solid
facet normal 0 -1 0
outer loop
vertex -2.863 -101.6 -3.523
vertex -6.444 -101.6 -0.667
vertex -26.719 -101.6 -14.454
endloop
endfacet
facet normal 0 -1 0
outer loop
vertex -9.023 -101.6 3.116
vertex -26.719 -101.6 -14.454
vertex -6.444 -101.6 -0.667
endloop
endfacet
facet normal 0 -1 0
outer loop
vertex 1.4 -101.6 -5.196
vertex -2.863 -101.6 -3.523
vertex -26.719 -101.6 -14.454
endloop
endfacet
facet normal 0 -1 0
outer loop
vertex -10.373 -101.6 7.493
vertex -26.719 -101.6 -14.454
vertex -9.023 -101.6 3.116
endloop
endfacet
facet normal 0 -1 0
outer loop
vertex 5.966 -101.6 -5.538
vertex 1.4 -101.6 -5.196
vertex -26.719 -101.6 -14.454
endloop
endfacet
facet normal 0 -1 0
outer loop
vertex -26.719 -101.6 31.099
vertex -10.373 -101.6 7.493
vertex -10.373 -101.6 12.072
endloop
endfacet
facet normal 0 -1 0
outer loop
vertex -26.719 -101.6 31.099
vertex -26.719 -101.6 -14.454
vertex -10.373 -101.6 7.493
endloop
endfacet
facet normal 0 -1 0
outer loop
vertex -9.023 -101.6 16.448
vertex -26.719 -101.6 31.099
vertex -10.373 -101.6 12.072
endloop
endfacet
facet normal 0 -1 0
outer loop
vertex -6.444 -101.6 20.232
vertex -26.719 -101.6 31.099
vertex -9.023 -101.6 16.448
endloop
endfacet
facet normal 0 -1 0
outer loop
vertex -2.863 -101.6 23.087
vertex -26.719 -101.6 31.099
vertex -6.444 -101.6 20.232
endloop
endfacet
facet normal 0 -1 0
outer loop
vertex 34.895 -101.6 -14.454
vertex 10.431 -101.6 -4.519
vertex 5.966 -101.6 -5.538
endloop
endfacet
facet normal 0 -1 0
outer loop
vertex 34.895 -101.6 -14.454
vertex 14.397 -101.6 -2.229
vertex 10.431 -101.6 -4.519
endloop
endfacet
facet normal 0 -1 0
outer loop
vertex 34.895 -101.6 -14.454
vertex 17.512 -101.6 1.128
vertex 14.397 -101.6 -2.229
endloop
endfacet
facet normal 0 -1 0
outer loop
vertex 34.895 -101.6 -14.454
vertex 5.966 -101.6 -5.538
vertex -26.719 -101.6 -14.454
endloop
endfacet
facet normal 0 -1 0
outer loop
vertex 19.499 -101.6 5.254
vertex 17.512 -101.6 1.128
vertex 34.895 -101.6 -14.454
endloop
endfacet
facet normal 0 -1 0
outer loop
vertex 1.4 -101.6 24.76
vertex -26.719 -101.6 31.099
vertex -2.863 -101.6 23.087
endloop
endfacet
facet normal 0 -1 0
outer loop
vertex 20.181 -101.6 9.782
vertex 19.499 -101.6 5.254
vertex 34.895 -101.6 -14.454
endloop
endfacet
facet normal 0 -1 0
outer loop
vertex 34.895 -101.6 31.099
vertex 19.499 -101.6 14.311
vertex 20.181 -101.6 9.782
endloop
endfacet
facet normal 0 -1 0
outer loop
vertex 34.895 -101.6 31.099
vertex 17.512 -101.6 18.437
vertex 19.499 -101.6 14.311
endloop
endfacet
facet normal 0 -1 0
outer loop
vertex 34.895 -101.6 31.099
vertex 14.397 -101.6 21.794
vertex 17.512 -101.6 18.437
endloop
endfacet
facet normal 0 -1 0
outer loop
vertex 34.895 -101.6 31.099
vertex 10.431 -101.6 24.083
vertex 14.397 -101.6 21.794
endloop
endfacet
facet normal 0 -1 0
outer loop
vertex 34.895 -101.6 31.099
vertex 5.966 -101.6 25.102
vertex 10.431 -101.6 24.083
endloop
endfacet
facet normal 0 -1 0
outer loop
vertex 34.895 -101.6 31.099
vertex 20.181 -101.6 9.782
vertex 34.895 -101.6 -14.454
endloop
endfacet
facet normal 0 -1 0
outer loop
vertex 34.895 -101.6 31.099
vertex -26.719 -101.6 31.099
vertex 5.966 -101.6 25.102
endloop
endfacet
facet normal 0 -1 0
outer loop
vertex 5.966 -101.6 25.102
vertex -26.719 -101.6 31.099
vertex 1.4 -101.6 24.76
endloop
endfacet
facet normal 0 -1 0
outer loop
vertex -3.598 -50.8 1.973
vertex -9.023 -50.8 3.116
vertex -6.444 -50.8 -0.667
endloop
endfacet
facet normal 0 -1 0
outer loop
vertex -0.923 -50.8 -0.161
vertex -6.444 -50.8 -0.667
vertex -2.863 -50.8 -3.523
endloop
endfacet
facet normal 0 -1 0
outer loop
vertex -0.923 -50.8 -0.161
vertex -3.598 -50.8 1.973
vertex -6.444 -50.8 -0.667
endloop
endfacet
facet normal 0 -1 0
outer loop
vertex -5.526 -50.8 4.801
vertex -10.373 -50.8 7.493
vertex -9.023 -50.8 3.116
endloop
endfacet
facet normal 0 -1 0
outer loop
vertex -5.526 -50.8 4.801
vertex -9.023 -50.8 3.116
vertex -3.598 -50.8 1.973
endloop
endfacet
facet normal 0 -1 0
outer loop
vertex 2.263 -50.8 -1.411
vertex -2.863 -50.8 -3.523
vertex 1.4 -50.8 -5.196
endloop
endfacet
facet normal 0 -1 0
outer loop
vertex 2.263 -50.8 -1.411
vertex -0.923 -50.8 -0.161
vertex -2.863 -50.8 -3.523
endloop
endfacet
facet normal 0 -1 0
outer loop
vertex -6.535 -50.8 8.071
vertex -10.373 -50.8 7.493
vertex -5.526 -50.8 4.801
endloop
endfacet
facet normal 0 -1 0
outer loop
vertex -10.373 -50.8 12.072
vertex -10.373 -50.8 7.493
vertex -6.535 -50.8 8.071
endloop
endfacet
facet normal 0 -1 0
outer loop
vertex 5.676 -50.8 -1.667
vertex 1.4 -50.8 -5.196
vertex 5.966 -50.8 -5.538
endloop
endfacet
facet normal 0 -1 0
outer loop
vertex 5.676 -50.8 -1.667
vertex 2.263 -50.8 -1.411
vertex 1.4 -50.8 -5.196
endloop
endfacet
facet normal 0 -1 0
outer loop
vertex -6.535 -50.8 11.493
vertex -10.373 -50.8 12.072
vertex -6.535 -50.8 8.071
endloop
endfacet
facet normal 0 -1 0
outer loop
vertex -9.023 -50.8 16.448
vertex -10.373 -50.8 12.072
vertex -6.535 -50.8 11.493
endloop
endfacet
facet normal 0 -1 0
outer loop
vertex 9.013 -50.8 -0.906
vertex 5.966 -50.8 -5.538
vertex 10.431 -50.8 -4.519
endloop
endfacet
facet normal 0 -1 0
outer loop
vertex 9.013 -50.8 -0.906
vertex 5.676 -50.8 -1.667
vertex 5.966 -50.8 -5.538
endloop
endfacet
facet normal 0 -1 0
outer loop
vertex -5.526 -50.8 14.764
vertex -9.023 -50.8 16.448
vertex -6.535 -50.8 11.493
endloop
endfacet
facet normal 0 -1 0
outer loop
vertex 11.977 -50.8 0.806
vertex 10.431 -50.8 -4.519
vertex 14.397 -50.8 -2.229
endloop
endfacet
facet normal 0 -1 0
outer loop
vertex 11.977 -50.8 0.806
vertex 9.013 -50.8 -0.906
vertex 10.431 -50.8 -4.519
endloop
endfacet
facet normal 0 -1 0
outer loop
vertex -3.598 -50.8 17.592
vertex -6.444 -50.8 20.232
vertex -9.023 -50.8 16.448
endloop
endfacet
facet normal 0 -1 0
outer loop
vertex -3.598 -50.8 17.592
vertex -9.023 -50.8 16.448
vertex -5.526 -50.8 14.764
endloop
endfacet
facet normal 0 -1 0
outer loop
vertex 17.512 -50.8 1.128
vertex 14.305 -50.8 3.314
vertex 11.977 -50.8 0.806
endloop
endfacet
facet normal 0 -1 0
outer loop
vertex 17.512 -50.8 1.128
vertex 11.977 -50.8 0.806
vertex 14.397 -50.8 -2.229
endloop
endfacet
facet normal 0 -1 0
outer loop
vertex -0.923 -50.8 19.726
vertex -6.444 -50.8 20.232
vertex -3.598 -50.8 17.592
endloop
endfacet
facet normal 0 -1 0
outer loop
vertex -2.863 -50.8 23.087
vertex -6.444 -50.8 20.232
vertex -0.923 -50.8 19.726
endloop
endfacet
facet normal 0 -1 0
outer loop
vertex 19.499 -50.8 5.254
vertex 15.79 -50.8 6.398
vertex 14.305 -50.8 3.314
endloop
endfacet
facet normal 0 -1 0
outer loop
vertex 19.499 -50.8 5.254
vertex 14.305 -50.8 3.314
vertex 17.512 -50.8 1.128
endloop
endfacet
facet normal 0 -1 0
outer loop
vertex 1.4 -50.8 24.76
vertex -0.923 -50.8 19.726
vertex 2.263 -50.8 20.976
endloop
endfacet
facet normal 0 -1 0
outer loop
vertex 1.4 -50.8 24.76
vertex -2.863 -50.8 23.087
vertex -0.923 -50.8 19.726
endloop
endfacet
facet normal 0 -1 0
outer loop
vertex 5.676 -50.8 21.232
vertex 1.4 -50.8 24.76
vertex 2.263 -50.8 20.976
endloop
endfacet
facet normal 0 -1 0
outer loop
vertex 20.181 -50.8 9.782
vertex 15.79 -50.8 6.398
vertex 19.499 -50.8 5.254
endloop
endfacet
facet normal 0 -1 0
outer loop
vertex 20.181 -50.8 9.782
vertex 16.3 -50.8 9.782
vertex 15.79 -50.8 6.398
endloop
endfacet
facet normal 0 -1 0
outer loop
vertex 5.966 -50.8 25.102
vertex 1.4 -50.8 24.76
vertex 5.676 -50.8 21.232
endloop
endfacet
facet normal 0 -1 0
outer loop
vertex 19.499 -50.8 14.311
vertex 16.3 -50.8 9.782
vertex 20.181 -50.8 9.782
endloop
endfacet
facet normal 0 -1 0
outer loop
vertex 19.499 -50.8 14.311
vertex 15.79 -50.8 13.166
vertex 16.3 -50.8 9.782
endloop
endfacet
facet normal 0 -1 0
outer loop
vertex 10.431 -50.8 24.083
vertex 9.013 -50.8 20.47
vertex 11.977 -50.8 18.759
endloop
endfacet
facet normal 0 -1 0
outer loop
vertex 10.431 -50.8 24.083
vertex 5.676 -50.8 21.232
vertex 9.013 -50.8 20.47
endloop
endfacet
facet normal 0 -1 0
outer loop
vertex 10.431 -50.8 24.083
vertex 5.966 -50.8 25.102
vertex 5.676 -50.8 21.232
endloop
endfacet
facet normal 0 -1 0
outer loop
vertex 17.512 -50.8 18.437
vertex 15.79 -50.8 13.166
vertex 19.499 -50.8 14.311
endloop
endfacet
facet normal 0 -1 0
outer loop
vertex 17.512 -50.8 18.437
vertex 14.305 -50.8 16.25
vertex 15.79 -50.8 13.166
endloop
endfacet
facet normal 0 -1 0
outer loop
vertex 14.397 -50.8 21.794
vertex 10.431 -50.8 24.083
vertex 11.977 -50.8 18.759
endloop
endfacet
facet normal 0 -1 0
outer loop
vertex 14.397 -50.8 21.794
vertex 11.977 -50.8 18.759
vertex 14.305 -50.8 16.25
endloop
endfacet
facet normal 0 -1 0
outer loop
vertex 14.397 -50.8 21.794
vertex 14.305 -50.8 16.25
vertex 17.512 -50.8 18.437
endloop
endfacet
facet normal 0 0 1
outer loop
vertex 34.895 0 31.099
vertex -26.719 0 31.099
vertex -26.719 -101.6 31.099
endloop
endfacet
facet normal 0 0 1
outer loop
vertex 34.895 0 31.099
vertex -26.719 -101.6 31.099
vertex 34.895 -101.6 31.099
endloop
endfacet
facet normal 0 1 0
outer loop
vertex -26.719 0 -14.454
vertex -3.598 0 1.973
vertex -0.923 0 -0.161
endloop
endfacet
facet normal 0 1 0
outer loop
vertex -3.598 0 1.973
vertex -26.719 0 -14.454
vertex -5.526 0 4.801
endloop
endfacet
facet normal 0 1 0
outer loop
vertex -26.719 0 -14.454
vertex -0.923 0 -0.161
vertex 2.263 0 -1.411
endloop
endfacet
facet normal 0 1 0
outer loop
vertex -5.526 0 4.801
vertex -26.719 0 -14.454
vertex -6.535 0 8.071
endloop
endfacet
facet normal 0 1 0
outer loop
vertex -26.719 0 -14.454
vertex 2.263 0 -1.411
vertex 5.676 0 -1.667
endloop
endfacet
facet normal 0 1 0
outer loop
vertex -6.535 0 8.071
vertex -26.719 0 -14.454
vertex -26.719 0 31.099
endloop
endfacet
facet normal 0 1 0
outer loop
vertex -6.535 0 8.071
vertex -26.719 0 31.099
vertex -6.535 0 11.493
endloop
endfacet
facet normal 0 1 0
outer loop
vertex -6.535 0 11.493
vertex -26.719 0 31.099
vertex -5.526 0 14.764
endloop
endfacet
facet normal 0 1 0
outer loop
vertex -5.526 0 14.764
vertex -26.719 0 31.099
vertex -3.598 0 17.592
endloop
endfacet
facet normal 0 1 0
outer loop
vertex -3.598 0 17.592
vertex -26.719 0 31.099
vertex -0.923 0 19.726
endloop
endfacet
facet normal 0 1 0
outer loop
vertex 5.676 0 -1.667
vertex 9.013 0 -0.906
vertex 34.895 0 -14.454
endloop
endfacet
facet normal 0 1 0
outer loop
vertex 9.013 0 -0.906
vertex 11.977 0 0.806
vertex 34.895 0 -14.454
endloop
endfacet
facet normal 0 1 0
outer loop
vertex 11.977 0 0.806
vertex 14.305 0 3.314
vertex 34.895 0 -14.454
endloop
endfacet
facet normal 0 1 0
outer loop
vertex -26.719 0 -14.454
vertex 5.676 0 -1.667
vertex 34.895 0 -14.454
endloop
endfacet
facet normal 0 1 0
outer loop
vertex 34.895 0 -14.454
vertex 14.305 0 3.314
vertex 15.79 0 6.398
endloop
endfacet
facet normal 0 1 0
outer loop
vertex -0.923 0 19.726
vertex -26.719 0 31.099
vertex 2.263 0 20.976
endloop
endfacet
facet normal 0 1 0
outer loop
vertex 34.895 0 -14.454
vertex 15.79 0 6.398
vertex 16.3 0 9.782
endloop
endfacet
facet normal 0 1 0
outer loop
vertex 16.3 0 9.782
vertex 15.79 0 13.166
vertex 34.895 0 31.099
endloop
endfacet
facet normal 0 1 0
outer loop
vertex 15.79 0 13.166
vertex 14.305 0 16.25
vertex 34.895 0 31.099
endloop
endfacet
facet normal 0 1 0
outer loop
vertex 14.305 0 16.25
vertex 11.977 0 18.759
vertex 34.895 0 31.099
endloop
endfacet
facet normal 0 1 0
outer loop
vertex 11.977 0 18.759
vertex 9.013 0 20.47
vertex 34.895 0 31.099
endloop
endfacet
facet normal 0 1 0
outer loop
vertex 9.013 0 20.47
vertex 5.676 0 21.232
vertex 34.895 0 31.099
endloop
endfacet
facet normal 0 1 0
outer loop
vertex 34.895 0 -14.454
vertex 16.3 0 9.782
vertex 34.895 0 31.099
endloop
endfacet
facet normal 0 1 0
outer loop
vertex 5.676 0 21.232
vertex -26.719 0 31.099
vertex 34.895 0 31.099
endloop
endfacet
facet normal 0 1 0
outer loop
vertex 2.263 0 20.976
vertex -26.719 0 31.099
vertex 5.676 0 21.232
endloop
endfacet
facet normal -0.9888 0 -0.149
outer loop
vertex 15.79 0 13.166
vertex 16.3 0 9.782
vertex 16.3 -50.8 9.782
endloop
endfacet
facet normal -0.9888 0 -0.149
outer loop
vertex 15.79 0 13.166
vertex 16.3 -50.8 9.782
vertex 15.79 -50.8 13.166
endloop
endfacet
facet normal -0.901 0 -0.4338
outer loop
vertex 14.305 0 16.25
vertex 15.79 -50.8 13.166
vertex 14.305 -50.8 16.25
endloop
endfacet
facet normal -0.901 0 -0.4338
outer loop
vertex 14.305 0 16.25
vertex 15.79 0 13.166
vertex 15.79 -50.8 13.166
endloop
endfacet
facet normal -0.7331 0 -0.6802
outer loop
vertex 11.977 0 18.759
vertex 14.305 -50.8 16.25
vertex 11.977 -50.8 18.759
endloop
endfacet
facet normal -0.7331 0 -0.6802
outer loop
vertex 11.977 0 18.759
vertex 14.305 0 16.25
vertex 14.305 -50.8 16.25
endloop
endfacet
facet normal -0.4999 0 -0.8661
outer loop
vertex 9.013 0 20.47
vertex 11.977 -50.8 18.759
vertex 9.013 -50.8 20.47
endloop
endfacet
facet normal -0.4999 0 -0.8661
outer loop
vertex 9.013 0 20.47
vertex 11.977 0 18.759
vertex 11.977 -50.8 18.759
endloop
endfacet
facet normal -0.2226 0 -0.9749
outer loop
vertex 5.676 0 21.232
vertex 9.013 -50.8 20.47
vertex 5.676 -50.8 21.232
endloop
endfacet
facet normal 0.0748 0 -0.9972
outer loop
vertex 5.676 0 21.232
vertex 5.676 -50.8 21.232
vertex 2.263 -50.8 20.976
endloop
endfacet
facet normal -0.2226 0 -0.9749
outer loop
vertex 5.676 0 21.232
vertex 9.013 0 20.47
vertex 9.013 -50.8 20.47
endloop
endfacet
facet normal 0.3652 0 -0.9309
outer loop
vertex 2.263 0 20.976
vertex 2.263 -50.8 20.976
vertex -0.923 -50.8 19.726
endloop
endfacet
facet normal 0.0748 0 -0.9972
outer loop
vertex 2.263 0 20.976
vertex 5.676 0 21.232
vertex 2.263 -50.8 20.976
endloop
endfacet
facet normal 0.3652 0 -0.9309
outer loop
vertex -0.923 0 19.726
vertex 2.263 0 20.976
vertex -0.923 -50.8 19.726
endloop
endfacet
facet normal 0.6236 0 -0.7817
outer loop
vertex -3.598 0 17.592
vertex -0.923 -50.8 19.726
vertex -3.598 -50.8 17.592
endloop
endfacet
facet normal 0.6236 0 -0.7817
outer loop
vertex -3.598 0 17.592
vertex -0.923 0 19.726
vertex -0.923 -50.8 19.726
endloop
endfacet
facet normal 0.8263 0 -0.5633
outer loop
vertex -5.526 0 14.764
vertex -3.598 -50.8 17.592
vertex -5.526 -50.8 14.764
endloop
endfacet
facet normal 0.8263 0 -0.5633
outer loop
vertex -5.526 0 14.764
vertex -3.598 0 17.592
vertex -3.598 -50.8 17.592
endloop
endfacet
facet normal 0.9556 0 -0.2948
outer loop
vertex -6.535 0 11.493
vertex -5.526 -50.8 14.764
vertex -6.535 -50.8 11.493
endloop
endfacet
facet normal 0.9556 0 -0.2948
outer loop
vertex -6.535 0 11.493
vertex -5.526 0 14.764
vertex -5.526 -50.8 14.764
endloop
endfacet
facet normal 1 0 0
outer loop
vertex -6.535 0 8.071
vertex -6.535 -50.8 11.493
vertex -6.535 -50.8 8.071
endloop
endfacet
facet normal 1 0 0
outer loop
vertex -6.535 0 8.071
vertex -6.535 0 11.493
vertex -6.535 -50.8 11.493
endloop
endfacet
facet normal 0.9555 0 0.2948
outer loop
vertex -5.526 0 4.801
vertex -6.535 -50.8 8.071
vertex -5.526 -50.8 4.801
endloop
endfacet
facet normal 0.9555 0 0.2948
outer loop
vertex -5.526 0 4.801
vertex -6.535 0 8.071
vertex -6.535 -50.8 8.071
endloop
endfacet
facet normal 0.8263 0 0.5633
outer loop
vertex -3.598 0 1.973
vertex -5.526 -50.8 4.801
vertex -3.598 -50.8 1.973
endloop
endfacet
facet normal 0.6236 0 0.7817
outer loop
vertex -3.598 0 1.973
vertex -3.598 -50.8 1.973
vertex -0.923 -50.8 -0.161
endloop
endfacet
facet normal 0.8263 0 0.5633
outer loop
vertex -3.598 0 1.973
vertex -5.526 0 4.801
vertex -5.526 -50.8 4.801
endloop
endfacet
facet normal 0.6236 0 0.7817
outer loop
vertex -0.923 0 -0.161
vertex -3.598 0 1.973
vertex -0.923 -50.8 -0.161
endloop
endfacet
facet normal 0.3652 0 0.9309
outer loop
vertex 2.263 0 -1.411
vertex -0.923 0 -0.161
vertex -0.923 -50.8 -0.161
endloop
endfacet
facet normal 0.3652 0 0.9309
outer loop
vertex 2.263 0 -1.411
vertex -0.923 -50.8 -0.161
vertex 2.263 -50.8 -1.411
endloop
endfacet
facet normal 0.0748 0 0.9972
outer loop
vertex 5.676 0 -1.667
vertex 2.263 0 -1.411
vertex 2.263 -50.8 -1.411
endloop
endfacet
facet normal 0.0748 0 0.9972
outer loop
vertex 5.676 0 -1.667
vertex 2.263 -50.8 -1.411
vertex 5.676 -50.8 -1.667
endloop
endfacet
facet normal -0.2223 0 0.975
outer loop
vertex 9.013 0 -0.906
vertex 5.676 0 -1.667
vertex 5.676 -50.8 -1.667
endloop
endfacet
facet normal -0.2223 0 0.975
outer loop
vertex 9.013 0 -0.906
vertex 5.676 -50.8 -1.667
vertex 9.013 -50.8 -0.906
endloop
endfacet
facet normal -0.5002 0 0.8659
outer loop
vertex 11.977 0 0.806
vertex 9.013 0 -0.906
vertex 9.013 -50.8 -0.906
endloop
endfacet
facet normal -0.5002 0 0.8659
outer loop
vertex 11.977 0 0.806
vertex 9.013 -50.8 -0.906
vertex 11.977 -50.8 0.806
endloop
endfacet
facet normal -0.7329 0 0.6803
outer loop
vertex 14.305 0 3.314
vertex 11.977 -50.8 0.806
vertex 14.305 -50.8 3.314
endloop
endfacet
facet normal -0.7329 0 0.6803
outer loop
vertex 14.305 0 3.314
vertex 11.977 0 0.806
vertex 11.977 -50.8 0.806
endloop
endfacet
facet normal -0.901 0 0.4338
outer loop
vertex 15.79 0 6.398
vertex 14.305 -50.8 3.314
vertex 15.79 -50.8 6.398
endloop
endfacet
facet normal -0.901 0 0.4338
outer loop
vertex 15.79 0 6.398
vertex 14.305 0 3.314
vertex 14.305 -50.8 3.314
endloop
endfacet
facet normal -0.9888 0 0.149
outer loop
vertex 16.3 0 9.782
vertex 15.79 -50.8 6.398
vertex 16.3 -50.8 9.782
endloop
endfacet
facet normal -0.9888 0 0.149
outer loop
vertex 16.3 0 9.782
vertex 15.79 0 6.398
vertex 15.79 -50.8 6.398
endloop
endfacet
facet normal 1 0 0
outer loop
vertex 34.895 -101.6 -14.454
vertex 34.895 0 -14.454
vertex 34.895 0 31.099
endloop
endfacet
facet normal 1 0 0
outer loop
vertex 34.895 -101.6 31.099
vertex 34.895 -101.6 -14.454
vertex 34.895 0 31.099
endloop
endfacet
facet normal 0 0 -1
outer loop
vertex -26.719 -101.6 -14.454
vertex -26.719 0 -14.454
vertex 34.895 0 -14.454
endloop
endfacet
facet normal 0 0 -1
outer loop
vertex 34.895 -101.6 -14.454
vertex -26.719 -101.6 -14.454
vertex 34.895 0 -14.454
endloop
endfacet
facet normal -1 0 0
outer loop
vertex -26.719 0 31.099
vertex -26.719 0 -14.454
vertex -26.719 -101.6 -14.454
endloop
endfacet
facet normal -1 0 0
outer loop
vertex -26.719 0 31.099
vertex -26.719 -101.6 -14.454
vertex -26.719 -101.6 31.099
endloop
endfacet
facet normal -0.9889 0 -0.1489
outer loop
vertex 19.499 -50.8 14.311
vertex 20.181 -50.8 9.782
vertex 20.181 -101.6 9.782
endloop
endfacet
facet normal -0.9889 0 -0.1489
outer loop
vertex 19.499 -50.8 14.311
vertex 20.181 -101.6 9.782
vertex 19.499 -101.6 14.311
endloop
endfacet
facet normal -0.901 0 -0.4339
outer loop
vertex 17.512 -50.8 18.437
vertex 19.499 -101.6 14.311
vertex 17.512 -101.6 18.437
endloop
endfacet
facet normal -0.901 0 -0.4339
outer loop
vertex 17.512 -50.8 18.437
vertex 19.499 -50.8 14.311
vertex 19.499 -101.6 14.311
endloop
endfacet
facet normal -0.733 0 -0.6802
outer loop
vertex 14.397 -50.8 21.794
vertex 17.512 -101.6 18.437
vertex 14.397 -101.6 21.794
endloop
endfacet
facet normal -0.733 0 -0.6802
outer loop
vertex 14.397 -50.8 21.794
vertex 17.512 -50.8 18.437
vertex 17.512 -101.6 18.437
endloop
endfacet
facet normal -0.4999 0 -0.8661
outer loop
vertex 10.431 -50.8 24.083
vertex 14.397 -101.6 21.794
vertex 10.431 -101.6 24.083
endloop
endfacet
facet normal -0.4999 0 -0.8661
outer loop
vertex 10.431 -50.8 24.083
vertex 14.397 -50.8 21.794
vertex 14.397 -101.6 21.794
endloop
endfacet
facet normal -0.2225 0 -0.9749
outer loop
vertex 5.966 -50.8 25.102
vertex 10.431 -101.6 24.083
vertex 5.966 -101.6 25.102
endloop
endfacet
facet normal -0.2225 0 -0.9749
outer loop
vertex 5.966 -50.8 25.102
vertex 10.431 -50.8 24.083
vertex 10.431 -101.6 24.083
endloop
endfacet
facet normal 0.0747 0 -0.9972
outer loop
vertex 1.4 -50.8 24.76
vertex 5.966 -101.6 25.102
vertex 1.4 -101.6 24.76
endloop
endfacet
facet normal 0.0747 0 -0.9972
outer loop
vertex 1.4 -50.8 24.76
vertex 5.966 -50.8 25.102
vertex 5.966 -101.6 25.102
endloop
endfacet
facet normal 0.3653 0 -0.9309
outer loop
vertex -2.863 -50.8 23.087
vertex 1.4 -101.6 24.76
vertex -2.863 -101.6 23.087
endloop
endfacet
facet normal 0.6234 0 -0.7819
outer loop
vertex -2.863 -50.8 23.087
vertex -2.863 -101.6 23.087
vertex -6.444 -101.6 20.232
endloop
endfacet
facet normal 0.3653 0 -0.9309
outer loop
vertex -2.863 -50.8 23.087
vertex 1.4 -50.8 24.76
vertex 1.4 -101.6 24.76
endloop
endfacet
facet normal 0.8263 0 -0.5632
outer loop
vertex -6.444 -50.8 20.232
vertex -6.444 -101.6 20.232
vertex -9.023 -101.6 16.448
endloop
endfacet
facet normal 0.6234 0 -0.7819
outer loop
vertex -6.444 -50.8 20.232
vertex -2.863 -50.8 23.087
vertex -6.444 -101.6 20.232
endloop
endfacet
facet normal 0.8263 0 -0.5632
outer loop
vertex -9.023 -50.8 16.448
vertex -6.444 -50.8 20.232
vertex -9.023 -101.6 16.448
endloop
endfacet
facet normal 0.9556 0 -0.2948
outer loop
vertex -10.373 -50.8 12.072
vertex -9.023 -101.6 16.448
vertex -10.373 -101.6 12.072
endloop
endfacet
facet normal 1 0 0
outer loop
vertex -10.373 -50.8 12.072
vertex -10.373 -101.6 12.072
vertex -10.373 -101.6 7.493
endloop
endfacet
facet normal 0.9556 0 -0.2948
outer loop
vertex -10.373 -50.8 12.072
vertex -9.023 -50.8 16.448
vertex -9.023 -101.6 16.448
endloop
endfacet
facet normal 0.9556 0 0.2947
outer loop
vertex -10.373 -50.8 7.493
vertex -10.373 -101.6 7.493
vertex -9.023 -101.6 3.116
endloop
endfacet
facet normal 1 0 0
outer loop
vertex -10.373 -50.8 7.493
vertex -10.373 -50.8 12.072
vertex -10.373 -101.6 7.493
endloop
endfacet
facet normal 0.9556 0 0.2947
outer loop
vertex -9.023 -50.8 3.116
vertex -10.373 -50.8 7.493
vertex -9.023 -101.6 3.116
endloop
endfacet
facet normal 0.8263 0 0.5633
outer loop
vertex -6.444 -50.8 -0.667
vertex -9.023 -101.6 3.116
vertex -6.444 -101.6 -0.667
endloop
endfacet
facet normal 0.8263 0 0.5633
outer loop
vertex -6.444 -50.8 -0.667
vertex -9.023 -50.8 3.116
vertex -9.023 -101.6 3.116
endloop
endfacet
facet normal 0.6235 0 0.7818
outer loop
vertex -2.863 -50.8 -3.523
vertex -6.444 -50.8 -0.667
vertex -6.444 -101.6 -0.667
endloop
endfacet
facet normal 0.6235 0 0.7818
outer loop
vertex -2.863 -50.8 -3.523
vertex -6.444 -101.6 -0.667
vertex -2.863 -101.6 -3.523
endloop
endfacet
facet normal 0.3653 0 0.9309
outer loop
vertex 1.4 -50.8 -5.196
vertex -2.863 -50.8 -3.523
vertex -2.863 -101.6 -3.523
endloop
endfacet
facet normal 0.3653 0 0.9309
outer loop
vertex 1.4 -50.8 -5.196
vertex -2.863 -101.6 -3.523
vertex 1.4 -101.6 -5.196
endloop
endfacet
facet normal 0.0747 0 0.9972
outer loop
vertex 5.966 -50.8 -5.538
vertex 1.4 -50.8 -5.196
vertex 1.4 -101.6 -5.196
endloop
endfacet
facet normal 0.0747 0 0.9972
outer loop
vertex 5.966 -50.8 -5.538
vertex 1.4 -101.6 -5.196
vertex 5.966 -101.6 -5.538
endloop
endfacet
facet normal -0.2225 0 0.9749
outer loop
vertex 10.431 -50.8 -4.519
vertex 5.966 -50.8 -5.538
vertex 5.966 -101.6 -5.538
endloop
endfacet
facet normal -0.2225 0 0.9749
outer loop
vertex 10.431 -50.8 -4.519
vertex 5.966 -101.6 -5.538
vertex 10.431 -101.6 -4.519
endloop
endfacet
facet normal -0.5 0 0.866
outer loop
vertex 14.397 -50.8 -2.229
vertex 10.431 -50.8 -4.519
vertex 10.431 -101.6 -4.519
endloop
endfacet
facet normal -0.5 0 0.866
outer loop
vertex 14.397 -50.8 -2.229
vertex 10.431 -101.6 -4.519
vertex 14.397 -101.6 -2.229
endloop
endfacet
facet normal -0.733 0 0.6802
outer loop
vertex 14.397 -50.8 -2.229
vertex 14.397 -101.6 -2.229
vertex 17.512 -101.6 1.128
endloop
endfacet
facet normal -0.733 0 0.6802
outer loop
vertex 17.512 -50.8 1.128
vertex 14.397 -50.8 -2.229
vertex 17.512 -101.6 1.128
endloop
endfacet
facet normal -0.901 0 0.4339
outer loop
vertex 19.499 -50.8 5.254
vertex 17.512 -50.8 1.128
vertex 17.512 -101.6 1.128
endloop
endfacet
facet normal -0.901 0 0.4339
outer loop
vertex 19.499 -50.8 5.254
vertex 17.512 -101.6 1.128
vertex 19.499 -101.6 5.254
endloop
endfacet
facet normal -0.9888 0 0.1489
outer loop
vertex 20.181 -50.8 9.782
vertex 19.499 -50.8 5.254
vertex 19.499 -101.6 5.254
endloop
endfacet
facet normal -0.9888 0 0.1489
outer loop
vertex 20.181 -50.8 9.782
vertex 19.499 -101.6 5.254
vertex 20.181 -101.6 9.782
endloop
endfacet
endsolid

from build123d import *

# Parameters (mm, degrees)
F0_W     = 61.6135448217
F0_H     = 45.5531394109
F0_R     = 15.3630255382
F0_R_2   = 11.4814952194
F1_DEPTH = 50.8
F2_DEPTH = 101.6


# Not quite as in the source:
# - the program builds the solid bodies; features that only make, move or delete a surface that nothing else refers to are left out


with BuildPart() as f1:
    # F0 (on Front) → F1 (new body)
    with BuildSketch(Plane.XZ):
        with Locations((4.0881037712, 8.3222077228)):
            Rectangle(F0_W, F0_H)
        with Locations((4.818121437, 9.7822444513)):
            Circle(F0_R, mode=Mode.SUBTRACT)
        with Locations((4.818121437, 9.7822444513)):
            Circle(F0_R)
        with Locations((4.818121437, 9.7822444513)):
            Circle(F0_R_2, mode=Mode.SUBTRACT)
    extrude(amount=F1_DEPTH)

    # F0 (on Front) → F2 (join)
    with BuildSketch(Plane.XZ):
        with Locations((4.0881037712, 8.3222077228)):
            Rectangle(F0_W, F0_H)
        with Locations((4.818121437, 9.7822444513)):
            Circle(F0_R, mode=Mode.SUBTRACT)
    extrude(amount=F2_DEPTH)


solid = f1.part
